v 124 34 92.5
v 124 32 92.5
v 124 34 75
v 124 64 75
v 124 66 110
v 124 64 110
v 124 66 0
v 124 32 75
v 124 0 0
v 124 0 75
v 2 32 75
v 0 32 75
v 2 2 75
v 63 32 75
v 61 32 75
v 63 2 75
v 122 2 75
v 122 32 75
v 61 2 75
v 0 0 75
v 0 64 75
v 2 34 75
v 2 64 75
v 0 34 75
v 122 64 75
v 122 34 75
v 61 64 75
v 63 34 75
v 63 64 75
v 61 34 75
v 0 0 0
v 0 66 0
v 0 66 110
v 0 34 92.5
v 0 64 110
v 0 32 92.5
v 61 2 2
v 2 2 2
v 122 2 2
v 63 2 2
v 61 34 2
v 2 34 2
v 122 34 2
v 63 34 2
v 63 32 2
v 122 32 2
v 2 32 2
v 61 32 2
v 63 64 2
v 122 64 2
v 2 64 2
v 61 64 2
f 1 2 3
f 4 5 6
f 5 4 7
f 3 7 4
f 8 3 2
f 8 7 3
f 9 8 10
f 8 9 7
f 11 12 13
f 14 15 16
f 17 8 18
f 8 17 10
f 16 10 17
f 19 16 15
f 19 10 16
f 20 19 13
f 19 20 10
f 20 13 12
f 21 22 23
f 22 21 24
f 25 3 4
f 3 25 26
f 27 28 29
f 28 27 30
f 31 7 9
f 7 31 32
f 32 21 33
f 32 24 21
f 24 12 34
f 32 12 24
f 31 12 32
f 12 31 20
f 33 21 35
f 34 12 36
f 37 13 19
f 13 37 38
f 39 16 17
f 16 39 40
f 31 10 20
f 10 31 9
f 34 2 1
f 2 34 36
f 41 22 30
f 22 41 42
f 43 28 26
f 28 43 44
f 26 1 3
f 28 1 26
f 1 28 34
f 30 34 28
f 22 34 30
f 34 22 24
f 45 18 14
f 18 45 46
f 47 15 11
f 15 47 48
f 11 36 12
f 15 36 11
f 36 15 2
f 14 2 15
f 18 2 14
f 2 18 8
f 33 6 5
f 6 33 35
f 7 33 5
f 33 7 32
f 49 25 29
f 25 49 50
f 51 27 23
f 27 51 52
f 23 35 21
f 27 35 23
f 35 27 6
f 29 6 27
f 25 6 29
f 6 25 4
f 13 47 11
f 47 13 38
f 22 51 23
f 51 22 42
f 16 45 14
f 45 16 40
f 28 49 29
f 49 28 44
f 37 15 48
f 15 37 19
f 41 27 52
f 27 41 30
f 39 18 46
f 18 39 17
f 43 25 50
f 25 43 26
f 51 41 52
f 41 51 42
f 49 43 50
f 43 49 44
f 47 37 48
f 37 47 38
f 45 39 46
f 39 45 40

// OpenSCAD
include <write/Write.scad>

/* [Config] */
smallest_height=75;
tallest_height=110;

num_rows=2;

compartment_width=59;
compartment_depth=30;
remotes_per_row=2;

/* [Advanced] */
wall_thickness=2;
front_text="TV TIME !";
font_size=12;
font_spacing=2;
//TODO: mouse ears

/* [Hidden] */
height_increase_per_row=(tallest_height-smallest_height)/num_rows;
total_width=remotes_per_row*compartment_width+(remotes_per_row+1)*wall_thickness;
total_depth=num_rows*compartment_depth+(num_rows+1)*wall_thickness;


//floor
cube([total_width,total_depth,wall_thickness]);

//x walls
for ( i = [0:num_rows]){
	translate([0,i*(compartment_depth+wall_thickness),0])cube([total_width,wall_thickness,smallest_height+i*height_increase_per_row]);

}
   writecube(front_text,[total_width/2,0,smallest_height/2],[total_width,wall_thickness,smallest_height],face="front",h=font_size,space=font_spacing);

//y walls
for ( i = [0:remotes_per_row]){
 translate([i*(compartment_width+wall_thickness),0,0])cube([wall_thickness,total_depth,smallest_height]);
}
